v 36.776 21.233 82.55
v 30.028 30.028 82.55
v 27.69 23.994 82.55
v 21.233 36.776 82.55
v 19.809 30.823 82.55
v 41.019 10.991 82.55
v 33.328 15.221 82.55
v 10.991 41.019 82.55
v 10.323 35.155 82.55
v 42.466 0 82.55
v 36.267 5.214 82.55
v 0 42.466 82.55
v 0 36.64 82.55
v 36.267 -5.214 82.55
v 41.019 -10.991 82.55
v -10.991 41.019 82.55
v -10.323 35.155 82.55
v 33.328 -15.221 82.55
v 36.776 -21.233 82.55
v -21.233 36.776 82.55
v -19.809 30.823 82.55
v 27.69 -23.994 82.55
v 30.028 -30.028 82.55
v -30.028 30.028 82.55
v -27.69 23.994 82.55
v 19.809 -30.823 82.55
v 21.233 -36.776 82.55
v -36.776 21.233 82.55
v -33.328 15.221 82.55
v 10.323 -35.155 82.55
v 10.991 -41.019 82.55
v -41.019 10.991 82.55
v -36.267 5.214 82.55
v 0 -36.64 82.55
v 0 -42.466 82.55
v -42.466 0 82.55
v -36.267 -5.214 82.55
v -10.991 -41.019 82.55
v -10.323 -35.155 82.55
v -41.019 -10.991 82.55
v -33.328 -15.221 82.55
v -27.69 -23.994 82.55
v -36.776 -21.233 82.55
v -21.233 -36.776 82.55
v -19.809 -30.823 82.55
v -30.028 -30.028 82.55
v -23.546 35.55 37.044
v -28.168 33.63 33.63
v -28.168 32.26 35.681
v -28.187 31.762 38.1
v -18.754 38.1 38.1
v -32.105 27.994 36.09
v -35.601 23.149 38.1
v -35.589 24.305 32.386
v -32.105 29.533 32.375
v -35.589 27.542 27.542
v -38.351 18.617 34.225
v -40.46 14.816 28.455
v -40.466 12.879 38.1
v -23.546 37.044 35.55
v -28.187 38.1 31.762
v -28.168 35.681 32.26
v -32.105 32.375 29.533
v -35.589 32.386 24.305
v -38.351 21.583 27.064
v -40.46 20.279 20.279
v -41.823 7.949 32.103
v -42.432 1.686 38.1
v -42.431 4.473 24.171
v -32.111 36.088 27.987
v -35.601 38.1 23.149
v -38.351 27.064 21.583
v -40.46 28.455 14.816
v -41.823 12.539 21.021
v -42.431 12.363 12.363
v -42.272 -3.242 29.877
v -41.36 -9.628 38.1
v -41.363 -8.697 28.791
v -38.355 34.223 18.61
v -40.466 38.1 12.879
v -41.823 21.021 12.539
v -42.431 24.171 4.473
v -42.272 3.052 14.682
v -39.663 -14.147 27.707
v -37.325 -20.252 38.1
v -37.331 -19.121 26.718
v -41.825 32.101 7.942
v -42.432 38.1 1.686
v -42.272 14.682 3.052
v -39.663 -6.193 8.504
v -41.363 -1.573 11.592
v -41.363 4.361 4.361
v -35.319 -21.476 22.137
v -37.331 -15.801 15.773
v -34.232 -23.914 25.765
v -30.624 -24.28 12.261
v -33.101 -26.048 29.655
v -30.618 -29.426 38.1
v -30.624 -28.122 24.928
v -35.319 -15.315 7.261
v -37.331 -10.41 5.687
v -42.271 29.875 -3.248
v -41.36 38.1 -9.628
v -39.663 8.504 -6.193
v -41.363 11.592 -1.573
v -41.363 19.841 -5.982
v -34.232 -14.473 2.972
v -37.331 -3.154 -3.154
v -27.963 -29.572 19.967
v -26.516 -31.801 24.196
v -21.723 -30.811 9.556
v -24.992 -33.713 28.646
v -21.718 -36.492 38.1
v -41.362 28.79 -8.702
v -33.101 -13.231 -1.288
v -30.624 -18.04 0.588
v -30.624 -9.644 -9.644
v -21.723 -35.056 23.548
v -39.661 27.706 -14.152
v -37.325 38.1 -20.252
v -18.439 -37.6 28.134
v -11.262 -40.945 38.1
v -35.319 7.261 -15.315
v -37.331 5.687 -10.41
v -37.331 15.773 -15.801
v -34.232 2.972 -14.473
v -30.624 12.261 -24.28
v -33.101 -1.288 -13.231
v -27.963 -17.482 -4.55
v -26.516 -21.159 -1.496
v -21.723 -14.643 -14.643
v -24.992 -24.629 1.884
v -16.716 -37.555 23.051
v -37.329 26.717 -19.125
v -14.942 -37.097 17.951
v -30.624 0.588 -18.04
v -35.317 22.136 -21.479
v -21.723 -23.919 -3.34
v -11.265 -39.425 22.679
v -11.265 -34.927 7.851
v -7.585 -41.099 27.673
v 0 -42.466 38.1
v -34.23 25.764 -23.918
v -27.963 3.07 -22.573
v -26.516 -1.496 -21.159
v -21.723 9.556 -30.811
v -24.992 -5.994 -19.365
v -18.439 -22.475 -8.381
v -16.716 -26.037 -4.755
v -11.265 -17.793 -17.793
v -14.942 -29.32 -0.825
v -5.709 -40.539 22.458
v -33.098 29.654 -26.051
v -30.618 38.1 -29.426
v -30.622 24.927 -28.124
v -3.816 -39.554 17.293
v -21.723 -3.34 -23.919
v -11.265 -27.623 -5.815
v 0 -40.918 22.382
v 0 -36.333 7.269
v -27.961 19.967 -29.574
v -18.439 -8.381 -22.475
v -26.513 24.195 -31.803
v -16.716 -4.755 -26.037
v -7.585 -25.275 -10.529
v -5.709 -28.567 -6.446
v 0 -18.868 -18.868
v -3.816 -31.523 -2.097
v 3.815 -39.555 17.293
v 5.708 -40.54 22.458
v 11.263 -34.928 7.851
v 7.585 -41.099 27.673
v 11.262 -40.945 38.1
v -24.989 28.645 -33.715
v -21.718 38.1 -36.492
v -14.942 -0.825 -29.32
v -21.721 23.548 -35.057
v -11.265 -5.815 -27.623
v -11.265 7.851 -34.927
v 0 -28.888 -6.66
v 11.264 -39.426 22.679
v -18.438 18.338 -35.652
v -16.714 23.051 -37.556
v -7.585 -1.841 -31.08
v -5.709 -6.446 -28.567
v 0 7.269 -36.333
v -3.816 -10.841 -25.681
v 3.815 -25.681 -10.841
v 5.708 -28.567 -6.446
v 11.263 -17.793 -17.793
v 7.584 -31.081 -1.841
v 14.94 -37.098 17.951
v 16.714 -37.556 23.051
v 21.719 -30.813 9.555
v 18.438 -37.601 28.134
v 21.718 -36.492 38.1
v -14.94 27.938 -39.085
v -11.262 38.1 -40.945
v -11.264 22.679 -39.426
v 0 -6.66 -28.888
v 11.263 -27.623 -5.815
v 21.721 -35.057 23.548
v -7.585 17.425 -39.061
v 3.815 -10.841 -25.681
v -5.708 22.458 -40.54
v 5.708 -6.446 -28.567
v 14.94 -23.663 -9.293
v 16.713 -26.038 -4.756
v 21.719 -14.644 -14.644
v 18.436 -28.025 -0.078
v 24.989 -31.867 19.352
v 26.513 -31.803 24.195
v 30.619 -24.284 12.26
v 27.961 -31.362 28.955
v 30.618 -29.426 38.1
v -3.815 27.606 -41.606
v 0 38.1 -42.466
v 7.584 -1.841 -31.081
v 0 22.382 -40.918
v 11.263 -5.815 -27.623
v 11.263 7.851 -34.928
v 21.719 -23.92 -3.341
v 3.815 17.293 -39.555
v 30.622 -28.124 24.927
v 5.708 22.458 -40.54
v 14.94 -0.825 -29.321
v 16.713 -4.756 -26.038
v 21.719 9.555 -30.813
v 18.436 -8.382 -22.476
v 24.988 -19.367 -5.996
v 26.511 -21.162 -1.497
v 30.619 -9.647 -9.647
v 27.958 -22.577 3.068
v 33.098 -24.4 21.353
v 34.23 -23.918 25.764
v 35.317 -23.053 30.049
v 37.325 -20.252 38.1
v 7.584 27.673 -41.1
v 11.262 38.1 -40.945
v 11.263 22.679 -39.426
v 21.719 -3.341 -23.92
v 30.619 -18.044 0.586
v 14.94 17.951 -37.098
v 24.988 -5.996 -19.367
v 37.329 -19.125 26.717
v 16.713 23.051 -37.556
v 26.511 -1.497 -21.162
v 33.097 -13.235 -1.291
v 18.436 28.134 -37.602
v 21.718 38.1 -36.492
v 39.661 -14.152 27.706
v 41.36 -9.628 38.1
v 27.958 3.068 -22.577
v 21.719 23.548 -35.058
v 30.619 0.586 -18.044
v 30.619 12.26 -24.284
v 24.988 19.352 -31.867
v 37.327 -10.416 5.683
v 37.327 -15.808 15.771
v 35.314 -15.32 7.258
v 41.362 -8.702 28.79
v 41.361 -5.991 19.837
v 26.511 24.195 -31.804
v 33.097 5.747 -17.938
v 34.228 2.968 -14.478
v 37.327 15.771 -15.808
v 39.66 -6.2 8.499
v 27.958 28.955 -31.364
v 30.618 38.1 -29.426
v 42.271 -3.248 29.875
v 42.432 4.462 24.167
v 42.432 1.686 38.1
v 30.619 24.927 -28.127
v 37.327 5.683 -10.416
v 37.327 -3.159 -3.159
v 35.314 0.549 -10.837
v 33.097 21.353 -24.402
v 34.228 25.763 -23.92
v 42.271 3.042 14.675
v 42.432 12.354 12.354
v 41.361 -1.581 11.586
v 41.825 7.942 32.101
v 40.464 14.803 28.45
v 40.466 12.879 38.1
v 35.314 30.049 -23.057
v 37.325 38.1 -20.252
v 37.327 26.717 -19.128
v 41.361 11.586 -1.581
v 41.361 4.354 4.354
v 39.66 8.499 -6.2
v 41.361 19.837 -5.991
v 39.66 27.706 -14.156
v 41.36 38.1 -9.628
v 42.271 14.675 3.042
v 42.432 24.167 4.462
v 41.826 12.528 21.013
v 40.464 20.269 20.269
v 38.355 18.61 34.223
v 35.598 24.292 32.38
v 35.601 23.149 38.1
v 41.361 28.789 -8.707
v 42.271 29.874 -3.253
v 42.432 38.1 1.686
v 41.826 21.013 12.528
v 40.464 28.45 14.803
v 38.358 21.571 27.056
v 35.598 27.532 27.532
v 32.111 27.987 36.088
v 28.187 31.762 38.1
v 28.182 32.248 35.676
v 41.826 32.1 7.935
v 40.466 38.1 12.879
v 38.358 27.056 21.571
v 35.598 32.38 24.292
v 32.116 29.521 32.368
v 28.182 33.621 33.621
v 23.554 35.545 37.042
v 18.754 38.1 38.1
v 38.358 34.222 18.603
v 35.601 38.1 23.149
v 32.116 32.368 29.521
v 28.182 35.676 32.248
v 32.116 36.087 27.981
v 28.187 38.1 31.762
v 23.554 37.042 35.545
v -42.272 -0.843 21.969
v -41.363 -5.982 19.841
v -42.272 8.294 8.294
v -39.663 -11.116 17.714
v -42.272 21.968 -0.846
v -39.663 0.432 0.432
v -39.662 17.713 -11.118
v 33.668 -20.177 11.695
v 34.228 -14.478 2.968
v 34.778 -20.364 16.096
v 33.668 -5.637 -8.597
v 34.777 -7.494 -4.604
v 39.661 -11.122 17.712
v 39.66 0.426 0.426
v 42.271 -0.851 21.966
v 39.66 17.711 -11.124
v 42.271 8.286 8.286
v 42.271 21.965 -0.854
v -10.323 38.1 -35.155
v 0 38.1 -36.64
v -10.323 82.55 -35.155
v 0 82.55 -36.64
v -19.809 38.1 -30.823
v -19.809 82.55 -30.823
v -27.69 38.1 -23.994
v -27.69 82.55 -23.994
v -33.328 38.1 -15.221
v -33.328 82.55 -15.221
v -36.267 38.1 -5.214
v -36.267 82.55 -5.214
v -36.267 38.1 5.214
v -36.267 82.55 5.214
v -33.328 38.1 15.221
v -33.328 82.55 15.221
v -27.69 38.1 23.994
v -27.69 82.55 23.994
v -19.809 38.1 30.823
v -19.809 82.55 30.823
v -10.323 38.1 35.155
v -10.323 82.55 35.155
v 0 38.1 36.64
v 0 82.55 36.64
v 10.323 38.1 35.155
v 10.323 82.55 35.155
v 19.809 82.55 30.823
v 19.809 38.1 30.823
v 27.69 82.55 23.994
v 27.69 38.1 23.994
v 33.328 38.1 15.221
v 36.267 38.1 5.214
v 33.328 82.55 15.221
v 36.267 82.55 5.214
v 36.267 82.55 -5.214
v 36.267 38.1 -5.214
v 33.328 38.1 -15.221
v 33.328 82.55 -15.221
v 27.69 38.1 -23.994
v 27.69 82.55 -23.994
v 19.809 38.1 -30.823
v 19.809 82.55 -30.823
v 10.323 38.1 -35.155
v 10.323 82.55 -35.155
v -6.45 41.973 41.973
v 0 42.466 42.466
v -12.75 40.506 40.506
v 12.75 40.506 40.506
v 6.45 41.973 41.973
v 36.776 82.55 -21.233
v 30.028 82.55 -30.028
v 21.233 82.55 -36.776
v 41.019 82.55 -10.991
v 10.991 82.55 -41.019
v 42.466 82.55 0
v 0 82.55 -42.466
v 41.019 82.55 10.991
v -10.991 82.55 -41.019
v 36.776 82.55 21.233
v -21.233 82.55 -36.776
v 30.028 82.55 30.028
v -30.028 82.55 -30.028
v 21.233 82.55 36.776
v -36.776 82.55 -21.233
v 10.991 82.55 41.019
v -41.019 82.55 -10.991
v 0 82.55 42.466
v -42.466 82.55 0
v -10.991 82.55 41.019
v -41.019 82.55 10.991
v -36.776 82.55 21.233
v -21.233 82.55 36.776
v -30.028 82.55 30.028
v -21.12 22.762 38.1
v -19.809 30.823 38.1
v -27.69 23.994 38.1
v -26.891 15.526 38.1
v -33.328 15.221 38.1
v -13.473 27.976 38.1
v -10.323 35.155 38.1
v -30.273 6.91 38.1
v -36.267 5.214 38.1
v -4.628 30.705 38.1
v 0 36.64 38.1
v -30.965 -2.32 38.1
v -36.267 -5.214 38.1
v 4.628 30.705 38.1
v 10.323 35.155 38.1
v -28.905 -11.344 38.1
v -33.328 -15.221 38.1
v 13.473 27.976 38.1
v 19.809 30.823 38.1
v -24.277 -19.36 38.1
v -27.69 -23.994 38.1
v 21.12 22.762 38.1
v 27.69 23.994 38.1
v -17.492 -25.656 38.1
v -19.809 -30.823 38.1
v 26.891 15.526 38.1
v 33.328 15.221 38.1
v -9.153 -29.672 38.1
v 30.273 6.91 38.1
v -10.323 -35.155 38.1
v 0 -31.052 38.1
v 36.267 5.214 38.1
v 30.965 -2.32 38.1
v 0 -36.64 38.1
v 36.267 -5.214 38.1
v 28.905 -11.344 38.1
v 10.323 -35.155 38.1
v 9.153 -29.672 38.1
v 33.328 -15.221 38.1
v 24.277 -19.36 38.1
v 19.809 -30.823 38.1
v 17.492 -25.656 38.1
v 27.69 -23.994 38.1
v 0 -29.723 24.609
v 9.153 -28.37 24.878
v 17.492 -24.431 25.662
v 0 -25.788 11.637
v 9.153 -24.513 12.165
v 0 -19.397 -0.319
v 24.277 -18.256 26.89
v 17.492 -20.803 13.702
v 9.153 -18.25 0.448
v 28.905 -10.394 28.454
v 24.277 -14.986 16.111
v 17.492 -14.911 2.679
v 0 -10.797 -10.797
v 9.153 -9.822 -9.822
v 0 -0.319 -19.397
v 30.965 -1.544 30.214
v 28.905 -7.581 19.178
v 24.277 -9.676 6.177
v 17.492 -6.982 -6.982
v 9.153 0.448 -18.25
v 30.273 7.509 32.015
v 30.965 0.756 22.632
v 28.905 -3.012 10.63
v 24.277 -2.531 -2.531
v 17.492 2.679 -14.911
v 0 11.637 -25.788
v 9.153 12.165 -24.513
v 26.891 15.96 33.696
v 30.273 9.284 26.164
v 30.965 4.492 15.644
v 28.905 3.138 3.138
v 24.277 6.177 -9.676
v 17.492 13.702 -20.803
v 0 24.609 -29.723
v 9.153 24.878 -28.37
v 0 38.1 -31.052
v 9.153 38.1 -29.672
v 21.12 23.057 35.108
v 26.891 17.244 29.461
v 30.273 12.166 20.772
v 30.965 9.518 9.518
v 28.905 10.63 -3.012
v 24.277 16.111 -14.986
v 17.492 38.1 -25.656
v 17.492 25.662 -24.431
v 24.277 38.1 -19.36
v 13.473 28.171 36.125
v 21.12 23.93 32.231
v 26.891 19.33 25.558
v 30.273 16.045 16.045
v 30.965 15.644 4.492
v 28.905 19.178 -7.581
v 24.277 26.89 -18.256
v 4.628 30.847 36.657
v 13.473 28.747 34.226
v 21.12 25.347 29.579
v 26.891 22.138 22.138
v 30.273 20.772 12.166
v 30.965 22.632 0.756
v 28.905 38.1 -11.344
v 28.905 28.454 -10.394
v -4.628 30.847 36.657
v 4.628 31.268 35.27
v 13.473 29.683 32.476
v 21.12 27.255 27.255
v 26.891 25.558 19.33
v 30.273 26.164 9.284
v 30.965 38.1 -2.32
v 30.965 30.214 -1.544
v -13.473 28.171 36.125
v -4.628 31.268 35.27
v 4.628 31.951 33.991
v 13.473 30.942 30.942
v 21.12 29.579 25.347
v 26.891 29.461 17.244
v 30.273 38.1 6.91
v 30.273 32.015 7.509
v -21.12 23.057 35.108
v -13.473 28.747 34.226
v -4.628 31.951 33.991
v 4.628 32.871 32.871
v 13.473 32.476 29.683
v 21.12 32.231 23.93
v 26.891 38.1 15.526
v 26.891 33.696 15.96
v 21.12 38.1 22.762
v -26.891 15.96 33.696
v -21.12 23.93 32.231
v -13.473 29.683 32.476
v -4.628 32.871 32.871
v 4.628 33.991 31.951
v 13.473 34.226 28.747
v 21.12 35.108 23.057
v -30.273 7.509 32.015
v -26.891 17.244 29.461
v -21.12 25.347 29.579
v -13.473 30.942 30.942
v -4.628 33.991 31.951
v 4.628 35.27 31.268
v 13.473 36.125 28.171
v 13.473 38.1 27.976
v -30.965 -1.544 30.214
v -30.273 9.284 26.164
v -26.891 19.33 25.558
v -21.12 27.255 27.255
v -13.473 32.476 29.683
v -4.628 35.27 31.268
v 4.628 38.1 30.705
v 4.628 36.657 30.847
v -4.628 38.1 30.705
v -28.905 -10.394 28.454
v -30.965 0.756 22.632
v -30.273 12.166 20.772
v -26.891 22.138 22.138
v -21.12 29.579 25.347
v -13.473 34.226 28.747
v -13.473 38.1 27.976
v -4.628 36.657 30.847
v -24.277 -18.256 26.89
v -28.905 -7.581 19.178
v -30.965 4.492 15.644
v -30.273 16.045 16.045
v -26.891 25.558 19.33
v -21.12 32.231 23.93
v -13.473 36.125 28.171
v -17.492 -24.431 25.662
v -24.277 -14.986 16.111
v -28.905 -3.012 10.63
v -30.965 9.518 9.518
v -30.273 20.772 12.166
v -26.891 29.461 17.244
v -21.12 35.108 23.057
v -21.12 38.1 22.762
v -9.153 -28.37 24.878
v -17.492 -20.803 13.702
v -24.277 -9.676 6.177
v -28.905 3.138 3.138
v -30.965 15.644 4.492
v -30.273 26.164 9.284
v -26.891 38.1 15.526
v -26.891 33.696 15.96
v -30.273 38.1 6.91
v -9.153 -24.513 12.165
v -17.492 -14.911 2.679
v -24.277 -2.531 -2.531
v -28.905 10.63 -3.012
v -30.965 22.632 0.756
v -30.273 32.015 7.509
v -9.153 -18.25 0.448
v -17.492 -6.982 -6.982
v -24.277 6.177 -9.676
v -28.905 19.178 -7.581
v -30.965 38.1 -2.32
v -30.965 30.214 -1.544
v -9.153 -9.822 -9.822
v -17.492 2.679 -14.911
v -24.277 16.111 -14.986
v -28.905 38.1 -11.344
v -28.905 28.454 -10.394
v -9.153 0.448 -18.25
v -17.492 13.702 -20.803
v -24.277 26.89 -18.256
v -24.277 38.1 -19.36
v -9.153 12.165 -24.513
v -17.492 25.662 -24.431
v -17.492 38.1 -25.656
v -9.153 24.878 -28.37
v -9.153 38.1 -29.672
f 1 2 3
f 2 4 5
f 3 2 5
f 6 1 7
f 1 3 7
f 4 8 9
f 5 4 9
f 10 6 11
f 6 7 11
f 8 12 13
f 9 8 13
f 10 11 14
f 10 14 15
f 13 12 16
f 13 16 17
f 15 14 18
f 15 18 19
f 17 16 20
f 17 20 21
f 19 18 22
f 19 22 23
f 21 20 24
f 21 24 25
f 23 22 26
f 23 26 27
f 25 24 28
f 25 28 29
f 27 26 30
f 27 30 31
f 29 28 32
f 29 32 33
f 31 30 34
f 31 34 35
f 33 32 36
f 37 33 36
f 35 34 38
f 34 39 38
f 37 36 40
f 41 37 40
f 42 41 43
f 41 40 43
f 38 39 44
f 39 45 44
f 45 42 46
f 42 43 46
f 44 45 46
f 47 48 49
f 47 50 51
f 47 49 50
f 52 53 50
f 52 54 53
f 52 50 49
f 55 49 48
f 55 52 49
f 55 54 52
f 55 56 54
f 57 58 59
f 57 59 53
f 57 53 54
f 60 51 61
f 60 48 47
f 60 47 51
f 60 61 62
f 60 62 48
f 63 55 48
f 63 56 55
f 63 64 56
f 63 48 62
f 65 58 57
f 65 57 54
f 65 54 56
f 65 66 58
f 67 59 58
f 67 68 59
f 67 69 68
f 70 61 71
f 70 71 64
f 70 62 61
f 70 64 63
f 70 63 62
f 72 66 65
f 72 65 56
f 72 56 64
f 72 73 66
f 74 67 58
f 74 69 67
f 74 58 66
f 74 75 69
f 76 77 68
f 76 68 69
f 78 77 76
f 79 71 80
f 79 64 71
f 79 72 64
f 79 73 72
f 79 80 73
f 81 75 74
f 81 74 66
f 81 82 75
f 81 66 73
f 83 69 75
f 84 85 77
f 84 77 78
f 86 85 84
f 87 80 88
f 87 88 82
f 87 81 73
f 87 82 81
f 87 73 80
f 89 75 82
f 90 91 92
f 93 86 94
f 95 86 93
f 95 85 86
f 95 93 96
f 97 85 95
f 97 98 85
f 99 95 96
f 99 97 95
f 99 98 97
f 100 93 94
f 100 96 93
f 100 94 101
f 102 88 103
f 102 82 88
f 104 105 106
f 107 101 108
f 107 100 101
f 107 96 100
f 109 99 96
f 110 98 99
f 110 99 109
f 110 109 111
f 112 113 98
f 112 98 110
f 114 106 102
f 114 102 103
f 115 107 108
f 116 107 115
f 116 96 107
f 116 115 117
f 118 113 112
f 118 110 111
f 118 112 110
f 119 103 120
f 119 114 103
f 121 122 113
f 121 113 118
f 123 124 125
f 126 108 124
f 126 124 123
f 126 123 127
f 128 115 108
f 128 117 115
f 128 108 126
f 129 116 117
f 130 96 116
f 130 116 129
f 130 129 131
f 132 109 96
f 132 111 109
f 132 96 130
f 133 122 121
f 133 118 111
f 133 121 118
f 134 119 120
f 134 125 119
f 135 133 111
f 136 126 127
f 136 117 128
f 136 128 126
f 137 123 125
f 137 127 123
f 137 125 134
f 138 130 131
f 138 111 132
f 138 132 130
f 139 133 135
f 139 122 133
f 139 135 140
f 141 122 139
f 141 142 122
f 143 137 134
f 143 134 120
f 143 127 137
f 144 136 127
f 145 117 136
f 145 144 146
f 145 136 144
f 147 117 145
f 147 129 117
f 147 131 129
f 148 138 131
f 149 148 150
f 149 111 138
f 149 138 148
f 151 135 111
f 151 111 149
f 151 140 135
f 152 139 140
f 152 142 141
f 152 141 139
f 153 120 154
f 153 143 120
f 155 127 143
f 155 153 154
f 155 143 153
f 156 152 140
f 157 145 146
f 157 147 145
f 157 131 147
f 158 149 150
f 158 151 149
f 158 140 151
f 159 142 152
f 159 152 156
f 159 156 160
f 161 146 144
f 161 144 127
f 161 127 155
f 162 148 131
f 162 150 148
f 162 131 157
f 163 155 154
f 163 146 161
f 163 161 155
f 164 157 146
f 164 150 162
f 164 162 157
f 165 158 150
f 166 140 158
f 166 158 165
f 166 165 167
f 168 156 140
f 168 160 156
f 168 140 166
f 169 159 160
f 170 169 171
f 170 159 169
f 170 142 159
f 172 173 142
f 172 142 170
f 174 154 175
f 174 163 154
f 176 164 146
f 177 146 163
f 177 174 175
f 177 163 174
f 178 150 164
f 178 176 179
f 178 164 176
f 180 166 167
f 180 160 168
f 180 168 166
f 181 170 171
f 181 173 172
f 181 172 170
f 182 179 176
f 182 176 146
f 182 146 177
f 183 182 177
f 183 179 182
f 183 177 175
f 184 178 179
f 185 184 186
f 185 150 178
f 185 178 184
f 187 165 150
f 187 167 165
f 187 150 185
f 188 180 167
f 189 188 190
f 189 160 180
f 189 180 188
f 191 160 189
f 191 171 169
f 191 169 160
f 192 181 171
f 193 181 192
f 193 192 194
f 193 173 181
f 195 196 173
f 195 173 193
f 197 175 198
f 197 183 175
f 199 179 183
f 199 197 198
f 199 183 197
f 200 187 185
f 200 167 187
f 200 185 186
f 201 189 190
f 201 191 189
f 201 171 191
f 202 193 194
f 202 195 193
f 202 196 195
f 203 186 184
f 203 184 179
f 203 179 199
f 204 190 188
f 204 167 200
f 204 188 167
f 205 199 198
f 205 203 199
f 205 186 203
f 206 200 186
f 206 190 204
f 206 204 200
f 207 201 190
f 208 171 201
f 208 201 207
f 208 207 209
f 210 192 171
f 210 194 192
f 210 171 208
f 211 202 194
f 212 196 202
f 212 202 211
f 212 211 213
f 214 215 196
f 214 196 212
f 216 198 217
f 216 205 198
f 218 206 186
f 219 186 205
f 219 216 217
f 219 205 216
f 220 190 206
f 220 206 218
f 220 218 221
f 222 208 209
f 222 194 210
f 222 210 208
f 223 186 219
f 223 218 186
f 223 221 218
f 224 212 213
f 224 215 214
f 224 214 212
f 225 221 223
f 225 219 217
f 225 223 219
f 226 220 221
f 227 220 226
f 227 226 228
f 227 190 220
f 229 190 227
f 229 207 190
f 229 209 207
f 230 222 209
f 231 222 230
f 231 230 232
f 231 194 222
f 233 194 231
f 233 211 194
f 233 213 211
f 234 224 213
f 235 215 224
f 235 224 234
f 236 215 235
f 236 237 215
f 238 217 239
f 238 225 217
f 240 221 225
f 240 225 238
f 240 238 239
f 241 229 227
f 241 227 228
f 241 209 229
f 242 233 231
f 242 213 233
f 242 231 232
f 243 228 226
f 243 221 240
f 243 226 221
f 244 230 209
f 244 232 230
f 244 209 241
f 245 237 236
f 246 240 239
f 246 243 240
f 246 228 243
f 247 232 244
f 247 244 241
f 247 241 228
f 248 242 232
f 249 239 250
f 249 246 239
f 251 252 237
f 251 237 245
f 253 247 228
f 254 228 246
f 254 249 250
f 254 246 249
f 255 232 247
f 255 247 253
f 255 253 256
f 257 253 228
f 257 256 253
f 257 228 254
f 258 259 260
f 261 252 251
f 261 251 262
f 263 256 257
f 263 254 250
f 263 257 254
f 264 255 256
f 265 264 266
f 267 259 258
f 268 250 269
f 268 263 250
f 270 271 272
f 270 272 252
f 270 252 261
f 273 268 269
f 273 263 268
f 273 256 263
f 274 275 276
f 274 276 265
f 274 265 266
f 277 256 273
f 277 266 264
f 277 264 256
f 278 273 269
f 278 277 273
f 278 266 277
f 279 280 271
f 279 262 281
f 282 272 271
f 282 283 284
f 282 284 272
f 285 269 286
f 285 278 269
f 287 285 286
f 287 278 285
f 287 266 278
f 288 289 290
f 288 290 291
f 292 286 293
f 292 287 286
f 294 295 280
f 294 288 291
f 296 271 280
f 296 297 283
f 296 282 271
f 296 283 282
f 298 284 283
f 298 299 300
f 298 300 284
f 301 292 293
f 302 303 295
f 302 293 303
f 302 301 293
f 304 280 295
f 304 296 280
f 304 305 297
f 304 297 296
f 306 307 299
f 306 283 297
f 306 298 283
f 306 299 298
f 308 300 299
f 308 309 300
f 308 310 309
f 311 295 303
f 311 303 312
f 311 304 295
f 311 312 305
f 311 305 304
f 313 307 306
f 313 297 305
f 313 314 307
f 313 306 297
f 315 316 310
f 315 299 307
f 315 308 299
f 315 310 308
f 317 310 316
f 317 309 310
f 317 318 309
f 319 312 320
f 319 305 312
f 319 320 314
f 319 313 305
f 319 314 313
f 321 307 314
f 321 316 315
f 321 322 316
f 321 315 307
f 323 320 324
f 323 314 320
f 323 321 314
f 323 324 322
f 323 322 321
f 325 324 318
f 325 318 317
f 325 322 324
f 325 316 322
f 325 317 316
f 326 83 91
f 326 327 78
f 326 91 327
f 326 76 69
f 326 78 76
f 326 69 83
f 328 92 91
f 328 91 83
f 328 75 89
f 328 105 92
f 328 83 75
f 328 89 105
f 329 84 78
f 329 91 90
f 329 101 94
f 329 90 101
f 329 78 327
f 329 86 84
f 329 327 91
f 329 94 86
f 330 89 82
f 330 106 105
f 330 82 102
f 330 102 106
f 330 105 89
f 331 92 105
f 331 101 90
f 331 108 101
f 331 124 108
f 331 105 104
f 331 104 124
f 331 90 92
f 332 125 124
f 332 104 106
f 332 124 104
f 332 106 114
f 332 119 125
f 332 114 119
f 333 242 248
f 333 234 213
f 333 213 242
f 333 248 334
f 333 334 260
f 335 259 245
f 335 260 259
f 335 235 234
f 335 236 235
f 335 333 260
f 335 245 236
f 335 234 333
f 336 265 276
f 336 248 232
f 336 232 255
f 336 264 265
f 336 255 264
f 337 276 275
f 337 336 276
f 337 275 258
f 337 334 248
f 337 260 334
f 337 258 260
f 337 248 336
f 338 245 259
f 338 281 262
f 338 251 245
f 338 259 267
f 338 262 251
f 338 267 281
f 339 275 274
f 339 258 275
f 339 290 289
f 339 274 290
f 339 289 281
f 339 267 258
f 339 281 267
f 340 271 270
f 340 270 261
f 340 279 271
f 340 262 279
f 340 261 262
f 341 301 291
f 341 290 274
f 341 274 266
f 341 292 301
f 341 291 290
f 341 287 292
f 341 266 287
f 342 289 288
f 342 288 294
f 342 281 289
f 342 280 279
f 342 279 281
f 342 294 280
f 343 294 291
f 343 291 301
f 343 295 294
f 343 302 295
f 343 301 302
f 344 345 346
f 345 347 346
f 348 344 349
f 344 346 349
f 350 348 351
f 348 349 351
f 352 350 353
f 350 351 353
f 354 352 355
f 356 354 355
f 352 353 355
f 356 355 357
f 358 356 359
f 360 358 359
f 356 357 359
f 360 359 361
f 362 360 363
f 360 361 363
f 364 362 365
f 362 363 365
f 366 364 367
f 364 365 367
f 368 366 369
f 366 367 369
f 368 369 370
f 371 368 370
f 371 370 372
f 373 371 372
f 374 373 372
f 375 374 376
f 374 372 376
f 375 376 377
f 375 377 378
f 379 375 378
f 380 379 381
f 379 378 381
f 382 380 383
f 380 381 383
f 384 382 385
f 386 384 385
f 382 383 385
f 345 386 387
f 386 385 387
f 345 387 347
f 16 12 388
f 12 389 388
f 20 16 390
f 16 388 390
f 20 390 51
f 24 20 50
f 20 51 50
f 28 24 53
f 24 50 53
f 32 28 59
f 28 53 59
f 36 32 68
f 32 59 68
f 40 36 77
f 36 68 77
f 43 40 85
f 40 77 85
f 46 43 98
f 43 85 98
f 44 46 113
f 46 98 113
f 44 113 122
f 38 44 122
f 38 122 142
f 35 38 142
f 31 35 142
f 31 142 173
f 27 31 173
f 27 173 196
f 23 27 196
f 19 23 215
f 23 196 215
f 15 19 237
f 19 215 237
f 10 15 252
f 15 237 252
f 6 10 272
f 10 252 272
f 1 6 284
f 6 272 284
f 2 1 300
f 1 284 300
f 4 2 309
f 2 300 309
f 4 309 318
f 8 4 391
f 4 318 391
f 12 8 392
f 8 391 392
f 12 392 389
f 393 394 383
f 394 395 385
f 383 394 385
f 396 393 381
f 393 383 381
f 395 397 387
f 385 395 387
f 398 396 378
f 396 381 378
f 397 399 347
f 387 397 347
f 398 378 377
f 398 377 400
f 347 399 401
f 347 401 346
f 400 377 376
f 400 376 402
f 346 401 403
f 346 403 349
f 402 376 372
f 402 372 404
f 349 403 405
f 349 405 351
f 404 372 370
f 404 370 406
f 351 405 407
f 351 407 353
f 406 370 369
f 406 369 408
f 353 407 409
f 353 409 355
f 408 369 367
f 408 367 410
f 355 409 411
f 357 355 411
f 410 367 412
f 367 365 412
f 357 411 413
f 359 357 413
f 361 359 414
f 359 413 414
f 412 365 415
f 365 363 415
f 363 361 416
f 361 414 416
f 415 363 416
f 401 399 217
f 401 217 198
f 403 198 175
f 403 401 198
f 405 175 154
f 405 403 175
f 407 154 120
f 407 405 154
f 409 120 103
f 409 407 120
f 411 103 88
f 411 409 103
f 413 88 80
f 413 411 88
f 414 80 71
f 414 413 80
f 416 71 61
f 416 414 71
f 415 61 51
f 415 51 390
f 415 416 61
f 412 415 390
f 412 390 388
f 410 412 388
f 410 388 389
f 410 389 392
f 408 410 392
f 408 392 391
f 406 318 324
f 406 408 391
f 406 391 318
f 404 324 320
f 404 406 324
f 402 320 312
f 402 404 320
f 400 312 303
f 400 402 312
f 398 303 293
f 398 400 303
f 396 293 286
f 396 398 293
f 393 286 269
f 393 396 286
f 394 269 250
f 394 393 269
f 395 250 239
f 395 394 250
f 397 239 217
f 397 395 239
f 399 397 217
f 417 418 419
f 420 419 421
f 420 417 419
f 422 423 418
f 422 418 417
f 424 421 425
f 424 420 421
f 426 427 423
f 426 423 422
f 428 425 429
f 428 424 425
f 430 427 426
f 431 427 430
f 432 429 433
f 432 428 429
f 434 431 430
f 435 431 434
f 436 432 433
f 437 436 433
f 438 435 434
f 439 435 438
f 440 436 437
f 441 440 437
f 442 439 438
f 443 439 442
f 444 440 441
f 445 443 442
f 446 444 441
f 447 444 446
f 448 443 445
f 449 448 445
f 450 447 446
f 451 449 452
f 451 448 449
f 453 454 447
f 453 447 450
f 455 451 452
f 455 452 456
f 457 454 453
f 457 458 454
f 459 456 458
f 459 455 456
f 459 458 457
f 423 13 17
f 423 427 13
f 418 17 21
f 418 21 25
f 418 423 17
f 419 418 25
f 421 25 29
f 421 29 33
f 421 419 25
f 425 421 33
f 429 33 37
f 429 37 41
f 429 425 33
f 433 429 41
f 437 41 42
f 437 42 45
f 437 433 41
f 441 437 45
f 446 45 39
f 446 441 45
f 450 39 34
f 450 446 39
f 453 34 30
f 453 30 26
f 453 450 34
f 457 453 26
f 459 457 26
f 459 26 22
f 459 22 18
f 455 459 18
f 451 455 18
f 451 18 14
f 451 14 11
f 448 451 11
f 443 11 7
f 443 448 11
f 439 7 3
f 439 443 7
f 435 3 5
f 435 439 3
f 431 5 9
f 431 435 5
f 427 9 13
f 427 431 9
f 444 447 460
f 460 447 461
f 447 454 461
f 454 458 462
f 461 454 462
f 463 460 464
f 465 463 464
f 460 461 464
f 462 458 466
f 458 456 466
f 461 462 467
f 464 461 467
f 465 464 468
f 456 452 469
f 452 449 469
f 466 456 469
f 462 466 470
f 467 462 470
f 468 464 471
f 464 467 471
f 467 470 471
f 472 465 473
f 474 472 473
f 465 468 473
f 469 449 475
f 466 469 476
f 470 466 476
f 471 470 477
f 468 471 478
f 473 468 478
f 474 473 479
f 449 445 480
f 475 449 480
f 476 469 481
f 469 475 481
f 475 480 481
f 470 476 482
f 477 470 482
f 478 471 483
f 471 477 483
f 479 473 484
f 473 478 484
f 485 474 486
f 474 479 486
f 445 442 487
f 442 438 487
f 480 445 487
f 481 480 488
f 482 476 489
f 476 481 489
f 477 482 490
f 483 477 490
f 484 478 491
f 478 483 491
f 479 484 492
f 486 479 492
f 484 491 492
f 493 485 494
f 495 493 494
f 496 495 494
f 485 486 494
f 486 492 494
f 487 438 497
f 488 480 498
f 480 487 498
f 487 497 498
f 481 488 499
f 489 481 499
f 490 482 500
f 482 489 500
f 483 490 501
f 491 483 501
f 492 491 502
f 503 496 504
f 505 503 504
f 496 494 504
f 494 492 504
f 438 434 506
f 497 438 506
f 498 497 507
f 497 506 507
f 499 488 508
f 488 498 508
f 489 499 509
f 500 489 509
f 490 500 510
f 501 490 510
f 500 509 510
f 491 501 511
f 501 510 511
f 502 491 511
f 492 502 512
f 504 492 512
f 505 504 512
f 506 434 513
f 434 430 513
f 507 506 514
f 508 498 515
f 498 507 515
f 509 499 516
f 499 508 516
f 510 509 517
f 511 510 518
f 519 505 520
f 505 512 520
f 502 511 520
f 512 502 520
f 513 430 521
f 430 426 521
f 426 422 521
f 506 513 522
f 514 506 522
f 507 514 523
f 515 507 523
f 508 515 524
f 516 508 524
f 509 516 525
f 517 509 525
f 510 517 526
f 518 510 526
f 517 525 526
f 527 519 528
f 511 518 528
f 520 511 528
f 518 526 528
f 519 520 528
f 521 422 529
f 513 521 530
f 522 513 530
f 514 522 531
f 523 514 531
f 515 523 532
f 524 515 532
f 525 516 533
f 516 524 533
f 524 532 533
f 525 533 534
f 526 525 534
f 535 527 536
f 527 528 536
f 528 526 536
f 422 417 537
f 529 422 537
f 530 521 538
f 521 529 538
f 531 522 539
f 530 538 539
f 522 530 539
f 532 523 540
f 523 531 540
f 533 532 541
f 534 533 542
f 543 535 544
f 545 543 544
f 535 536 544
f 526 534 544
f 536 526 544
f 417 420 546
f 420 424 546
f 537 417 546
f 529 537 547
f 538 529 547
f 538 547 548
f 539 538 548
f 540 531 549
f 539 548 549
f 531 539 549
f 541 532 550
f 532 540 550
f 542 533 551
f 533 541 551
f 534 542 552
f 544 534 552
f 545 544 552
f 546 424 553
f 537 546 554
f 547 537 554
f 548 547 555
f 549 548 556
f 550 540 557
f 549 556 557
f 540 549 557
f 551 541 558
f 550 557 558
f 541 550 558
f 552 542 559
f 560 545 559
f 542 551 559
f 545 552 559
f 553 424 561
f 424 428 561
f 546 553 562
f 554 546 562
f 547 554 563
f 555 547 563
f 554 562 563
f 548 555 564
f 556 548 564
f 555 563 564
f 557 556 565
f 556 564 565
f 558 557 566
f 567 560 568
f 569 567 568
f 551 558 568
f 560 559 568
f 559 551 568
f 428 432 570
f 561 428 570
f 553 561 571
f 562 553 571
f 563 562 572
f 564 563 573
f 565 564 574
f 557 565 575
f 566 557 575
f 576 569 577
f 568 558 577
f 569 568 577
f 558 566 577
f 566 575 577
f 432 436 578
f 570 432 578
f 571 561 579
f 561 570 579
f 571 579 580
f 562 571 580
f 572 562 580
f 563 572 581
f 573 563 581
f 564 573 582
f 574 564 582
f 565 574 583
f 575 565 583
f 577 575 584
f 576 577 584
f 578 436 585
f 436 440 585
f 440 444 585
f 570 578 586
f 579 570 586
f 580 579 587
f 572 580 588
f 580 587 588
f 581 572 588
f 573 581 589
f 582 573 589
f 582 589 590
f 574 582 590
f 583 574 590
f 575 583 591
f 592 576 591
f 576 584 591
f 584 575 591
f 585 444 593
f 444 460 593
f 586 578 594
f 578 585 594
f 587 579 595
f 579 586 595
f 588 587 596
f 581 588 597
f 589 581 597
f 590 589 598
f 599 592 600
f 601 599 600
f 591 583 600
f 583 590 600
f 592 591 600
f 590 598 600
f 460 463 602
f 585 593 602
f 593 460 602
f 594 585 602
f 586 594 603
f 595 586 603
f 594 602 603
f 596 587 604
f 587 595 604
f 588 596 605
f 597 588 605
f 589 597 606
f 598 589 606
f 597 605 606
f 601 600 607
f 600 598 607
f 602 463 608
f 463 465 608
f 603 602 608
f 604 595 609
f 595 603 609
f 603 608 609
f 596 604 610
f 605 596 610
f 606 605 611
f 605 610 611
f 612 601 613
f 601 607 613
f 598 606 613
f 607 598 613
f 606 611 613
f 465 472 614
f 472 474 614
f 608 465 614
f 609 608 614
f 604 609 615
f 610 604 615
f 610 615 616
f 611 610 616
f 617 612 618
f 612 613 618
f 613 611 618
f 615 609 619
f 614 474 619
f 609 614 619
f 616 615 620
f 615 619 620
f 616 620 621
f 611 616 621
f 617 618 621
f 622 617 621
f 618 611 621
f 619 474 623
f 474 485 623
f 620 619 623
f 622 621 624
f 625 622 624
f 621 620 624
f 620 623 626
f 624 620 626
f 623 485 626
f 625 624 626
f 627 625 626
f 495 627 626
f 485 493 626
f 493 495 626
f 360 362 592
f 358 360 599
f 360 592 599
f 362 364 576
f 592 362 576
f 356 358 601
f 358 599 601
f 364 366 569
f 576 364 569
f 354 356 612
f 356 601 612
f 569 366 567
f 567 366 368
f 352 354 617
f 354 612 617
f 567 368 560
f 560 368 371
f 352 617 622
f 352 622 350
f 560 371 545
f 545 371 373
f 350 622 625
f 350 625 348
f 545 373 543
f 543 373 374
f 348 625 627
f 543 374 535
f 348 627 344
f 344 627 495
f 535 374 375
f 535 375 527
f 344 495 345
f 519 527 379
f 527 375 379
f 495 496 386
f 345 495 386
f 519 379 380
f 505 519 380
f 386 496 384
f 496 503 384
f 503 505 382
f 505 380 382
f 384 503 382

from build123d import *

# Parameters (mm, degrees)
SKETCH2_W        = 44.45
SKETCH2_H        = 5.826125
SKETCH3_W        = 5.826125
SKETCH3_H        = 44.45
SWEEP1_OUTLINE_R = 31.0515
SWEEP1_ANGLE     = 90


# Read off the part's stored shape, not the designer's step: Sweep1
with BuildPart() as part:
    # Sketch2 → Revolve1 (revolve)
    with BuildSketch(Plane(origin=(0, 0, 0), x_dir=(0, 0, -1), z_dir=(1, 0, 0))):
        with Locations((-60.325, 39.5525625)):
            Rectangle(SKETCH2_W, SKETCH2_H)
    revolve(axis=Axis((0, 0, 0), (0, 0, 1)))

    # Sketch3 → Revolve2 (revolve)
    with BuildSketch(Plane(origin=(0, 0, 0), x_dir=(0, 0, -1), z_dir=(1, 0, 0))):
        with Locations((39.5525625, 60.325)):
            Rectangle(SKETCH3_W, SKETCH3_H)
    revolve(axis=Axis((0, 0, 0), (0, 1, 0)))

    # Sweep1 outline → Sweep1 (revolve)
    with BuildSketch(Plane(origin=(0, 38.1, 38.1), x_dir=(0, -1, 0), z_dir=(0, 0, 1))):
        with BuildLine():
            Line((0, 18.754181044), (0, -18.754181044))
            add(Edge.make_bspline(
                [(0, -18.754181044), (3.595121657, -26.057839615), (9.397449748, -33.407976072), (17.825883125, -39.559399853), (28.204619336, -42.465624968), (44.310790561, -42.46562502), (50.403307493, -41.329592494), (55.932569526, -39.150372881), (60.686650624, -36.321869277), (69.83985958, -28.979313764), (74.693549795, -23.427727825), (78.605101985, -16.344282836), (82.51560631, -3.11e-07), (78.605102252, 16.34428235), (74.693550018, 23.42772757), (69.839859698, 28.979313669), (60.686650629, 36.321869273), (55.932569539, 39.150372874), (50.403307515, 41.329592485), (44.310790594, 42.465625014), (28.204619371, 42.465624978), (17.825883146, 39.559399869), (9.397449758, 33.407976085), (3.59512166, 26.057839621), (0, 18.754181044)],
                knots=[3.599009571, 3.599009571, 3.599009571, 3.599009571, 3.599009571, 3.599009571, 4.698420057, 4.698420057, 4.698420057, 4.698420057, 5.388460062, 5.388460062, 5.388460062, 5.388460062, 6.283185297, 6.283185297, 6.283185297, 7.177910553, 7.177910553, 7.177910553, 7.177910553, 7.867950556, 7.867950556, 7.867950556, 7.867950556, 8.967361044, 8.967361044, 8.967361044, 8.967361044, 8.967361044, 8.967361044], degree=5, weights=[1, 1, 0.995343828, 0.991763785, 1, 1, 0.999483219, 0.999983206, 1, 1, 0.998916664, 0.997304294, 1.002695707, 0.997304293, 0.998916664, 1, 1, 0.999983206, 0.999483219, 1, 1, 0.991763785, 0.995343828, 1, 1]))
        make_face()
        with Locations((38.1, 0)):
            Circle(SWEEP1_OUTLINE_R, mode=Mode.SUBTRACT)
    revolve(axis=Axis((0, 38.1, 38.1), (1, 0, 0)), revolution_arc=SWEEP1_ANGLE)


solid = part.part
